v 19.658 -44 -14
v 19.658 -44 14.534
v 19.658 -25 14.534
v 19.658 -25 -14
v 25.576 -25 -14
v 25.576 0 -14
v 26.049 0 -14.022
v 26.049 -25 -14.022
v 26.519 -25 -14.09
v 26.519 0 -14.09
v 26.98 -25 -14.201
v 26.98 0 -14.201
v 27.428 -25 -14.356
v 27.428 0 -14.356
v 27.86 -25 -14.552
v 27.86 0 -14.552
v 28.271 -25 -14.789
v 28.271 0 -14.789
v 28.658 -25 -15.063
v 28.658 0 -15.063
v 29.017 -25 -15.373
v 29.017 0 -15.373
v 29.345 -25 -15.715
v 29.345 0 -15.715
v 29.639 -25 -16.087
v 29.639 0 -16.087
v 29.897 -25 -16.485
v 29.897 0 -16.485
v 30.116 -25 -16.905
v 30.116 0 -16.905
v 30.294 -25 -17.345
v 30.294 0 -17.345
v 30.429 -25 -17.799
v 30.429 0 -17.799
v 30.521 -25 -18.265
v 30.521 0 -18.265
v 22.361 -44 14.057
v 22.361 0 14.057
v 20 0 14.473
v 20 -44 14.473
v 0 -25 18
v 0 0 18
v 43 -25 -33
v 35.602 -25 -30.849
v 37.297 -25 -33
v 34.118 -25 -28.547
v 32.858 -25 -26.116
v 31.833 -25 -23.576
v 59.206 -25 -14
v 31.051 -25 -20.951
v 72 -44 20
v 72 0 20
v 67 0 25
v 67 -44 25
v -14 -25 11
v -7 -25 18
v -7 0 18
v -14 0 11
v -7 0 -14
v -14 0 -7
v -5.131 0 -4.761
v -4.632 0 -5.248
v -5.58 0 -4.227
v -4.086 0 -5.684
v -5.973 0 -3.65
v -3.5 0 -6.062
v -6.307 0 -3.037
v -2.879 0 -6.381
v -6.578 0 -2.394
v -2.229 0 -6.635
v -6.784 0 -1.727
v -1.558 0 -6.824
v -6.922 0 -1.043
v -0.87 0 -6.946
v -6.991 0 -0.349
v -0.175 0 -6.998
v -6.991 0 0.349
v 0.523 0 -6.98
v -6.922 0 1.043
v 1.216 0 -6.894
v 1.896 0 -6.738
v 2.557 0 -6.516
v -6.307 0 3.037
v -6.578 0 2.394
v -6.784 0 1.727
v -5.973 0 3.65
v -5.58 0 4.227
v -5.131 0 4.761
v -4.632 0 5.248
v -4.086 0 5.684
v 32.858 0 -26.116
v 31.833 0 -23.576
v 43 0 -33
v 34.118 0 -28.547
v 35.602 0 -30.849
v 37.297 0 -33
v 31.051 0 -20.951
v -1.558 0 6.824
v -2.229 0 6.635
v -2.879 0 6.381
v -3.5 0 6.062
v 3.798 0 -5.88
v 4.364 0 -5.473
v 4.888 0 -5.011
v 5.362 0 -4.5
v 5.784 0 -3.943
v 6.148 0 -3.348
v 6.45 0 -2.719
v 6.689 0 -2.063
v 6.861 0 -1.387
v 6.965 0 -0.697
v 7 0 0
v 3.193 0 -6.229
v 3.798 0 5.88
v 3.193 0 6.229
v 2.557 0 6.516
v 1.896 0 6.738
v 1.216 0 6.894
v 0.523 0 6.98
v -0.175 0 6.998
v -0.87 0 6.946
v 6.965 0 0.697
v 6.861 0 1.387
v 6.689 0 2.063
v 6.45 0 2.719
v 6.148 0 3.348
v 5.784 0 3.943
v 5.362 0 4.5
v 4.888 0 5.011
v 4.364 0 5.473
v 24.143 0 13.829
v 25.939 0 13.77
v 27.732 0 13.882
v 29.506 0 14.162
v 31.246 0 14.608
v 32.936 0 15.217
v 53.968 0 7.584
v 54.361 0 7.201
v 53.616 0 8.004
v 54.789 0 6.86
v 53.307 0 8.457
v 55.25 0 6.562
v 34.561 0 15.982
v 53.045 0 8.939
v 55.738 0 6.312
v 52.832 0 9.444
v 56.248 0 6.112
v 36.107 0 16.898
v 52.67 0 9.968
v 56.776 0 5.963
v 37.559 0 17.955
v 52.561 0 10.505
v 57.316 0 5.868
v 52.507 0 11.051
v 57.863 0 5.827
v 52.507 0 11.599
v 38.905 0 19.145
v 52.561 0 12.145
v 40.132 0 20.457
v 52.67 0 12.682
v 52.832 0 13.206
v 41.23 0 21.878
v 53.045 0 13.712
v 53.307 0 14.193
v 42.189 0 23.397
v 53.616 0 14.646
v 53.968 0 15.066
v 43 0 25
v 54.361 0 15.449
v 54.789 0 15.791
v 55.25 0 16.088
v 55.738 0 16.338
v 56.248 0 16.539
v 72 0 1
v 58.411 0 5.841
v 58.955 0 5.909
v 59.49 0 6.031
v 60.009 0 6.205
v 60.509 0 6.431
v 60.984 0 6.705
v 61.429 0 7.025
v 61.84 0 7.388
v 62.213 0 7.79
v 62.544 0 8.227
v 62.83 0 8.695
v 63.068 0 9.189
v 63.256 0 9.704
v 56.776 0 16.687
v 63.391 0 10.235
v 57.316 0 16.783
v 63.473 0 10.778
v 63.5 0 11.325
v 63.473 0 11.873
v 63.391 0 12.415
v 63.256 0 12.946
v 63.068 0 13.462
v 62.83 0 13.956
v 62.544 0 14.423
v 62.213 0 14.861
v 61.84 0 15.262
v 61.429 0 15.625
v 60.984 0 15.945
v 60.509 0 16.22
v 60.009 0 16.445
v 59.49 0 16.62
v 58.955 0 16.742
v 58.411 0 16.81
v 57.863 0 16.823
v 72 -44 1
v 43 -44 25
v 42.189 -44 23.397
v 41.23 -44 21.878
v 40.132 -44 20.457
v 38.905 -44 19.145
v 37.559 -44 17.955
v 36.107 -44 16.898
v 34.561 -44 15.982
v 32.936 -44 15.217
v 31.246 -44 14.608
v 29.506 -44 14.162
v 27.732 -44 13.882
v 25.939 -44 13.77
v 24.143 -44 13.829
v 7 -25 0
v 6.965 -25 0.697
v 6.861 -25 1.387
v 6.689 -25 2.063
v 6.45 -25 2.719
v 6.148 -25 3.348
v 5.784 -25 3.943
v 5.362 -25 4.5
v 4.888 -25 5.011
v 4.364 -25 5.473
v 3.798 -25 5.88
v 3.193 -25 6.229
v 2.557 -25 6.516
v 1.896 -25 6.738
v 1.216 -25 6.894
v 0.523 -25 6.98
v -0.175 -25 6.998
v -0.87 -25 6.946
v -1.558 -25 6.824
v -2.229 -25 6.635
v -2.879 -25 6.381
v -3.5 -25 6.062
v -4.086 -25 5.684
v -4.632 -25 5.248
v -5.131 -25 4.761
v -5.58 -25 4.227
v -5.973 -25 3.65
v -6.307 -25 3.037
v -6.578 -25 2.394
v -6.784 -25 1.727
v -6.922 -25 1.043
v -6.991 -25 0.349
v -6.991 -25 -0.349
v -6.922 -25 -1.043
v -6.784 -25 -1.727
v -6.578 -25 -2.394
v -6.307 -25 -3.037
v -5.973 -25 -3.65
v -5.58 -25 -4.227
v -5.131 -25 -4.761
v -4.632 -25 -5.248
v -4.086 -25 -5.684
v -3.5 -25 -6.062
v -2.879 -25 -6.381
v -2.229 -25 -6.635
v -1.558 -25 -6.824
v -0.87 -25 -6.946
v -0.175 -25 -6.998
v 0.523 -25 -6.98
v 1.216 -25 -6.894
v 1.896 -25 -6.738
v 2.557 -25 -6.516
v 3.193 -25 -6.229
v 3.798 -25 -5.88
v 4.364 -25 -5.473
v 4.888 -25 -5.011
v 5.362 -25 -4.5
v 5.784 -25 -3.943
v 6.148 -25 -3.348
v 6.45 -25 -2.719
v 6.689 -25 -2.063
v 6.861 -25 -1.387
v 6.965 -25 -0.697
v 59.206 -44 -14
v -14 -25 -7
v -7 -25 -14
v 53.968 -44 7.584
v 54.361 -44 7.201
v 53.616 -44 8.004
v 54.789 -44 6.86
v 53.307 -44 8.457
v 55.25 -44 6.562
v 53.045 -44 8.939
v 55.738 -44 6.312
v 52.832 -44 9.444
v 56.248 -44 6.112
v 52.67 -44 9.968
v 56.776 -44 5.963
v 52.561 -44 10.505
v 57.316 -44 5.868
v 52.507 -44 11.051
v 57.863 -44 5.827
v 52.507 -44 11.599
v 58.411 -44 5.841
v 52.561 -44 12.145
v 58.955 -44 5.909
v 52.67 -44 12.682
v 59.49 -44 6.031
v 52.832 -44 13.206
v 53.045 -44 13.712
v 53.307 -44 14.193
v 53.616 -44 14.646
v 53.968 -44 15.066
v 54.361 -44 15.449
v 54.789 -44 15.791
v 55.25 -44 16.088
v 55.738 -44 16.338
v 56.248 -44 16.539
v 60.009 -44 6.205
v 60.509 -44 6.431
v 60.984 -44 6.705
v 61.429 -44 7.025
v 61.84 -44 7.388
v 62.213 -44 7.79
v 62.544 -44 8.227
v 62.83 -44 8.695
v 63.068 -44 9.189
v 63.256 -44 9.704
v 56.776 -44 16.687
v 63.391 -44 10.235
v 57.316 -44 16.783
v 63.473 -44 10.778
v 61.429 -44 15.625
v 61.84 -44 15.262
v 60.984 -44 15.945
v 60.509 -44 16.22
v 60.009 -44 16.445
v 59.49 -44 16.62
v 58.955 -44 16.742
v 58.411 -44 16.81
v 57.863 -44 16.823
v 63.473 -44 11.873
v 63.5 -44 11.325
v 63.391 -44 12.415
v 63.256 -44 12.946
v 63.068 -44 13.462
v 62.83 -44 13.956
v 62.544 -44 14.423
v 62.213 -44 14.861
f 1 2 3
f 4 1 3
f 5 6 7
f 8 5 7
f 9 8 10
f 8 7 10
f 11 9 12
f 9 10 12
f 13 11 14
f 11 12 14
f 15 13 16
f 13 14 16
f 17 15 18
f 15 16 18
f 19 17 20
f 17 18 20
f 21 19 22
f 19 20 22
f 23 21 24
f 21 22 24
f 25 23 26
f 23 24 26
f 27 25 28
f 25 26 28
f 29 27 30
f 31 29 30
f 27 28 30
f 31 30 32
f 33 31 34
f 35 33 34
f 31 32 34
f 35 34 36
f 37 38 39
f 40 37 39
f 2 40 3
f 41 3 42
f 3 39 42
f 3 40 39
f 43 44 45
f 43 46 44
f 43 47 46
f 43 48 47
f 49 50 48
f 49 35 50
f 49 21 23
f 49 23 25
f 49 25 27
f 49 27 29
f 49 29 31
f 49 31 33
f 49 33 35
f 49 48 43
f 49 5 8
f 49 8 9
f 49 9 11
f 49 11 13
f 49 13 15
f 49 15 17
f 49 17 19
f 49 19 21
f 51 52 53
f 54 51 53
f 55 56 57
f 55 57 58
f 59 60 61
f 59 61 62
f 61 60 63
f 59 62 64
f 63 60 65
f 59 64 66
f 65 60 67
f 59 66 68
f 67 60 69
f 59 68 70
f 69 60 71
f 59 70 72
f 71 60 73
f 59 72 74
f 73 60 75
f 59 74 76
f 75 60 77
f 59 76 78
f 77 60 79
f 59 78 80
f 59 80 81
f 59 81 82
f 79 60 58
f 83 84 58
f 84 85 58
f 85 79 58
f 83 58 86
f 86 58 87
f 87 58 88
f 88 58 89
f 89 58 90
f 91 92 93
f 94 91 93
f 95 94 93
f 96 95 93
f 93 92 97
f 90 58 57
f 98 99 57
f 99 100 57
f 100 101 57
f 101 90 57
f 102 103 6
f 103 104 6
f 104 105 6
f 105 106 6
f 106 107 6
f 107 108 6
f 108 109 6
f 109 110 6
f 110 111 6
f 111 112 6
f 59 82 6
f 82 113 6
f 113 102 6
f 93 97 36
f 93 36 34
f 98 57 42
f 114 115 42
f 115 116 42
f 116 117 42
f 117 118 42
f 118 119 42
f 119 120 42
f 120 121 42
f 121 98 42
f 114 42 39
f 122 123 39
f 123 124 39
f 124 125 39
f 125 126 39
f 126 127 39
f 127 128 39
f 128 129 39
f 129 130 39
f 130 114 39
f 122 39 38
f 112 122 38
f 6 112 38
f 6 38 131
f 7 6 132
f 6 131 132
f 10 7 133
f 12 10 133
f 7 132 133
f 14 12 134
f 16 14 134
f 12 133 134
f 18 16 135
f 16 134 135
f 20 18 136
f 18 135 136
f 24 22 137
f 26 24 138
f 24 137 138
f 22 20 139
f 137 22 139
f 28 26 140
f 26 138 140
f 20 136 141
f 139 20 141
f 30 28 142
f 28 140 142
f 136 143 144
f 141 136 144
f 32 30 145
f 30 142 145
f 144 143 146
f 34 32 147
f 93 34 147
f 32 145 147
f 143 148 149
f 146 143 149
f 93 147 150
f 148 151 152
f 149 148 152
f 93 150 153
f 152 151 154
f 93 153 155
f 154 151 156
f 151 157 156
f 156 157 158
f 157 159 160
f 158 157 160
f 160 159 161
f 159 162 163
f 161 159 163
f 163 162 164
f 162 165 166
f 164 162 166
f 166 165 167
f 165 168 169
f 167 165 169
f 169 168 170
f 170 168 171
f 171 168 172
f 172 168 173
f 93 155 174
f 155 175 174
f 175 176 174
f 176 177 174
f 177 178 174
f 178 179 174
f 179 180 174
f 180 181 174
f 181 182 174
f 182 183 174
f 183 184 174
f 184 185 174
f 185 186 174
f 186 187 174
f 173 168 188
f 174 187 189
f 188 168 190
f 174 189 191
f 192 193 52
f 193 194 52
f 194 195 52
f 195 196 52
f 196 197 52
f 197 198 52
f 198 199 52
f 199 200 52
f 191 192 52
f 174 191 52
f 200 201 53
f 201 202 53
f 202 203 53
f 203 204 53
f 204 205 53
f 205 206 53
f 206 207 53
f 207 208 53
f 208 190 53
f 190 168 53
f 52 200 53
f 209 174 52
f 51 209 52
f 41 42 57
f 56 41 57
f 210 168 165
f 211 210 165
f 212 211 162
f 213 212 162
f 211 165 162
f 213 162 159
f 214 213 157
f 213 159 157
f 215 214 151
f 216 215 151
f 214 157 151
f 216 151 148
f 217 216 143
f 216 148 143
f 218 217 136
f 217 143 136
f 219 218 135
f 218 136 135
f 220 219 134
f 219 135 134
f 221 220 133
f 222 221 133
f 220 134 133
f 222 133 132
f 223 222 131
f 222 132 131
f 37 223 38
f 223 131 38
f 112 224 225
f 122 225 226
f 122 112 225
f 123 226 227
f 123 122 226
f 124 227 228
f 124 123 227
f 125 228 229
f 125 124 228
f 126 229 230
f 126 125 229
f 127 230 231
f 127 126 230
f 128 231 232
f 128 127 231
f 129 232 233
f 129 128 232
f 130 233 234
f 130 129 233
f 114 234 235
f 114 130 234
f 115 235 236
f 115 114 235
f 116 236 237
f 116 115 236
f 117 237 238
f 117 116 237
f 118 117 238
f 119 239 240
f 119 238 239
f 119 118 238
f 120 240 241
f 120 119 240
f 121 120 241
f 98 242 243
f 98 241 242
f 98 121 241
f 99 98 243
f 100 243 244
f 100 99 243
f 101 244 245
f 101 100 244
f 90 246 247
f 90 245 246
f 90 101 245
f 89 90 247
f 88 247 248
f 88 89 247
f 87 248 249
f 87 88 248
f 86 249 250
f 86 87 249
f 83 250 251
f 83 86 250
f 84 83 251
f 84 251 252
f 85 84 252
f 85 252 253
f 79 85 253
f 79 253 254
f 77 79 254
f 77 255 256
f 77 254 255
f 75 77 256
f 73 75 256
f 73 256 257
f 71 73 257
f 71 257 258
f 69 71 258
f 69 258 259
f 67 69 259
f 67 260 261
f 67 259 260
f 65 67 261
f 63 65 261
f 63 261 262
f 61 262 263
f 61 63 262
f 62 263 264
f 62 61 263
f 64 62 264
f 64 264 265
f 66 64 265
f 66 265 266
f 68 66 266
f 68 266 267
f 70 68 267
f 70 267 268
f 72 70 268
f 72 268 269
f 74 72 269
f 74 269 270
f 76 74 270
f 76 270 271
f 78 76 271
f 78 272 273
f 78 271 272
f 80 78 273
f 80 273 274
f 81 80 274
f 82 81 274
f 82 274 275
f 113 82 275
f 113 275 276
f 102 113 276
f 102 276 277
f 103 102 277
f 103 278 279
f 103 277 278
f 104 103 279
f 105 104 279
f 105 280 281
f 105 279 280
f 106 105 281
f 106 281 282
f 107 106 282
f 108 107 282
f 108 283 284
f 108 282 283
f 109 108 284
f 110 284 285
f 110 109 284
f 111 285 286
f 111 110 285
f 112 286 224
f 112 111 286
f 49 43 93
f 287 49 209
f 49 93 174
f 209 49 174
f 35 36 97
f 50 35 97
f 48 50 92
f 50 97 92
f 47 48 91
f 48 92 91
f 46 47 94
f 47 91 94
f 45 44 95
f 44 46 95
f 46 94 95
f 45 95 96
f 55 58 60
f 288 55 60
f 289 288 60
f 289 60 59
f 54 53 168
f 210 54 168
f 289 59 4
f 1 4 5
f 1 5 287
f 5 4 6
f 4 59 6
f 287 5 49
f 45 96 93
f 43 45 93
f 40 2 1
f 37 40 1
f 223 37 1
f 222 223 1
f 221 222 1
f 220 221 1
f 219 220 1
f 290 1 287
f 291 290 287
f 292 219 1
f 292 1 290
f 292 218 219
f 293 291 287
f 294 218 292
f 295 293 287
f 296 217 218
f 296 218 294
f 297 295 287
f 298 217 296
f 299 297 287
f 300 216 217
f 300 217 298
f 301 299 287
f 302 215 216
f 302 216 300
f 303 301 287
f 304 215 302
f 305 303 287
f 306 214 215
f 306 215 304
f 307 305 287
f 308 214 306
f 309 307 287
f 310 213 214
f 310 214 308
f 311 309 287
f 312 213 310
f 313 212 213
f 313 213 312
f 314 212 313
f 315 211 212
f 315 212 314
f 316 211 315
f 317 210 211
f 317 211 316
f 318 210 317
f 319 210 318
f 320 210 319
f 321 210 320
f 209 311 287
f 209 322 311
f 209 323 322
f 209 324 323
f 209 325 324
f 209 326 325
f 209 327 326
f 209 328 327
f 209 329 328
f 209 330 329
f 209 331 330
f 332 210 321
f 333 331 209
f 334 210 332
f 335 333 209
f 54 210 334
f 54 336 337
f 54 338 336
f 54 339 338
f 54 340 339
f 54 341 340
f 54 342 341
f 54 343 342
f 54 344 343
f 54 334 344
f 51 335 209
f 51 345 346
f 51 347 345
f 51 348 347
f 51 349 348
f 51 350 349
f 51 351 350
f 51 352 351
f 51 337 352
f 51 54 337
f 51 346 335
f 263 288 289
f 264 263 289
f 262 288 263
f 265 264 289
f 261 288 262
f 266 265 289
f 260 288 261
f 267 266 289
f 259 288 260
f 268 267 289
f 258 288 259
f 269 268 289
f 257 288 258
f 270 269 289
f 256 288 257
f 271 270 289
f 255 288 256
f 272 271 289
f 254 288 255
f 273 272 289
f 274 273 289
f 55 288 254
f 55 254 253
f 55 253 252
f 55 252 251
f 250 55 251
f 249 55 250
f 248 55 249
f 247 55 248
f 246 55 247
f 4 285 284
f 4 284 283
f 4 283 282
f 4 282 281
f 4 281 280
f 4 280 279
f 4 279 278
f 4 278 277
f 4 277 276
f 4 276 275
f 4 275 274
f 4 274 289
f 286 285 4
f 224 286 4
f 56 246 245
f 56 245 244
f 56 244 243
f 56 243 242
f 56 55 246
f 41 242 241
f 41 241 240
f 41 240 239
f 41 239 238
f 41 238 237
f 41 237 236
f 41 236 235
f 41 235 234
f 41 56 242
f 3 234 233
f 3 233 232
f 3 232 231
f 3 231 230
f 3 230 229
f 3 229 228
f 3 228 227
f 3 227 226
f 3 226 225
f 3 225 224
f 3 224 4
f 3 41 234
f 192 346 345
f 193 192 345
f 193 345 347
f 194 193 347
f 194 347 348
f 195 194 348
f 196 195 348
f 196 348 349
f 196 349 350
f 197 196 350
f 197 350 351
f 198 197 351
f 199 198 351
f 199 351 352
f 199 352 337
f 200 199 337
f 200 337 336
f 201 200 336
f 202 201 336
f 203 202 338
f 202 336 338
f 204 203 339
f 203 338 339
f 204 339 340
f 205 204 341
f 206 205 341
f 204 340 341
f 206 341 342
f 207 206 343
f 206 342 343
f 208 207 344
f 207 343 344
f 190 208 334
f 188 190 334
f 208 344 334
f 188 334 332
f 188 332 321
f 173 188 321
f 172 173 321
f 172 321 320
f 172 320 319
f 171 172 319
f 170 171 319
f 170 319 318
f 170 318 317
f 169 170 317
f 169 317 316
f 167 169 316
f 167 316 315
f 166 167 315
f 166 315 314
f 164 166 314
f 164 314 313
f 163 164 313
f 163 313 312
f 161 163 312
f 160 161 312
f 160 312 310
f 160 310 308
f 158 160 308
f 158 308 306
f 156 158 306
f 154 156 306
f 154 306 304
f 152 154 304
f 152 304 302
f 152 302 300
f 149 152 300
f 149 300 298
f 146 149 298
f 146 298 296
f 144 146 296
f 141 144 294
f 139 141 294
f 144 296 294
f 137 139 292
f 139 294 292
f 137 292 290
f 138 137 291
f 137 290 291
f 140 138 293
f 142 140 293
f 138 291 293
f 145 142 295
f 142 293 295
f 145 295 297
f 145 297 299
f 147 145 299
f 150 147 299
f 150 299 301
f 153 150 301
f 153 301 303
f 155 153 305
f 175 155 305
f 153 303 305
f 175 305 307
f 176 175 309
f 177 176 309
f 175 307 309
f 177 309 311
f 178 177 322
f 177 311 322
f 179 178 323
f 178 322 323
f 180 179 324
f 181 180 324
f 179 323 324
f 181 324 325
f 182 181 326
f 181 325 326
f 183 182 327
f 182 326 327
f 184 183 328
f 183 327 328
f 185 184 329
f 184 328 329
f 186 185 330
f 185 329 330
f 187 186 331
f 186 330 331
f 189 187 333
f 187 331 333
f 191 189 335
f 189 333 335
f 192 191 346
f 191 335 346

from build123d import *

# Parameters (mm, degrees)
F0_R     = 7
F1_DEPTH = 44
F2_W     = 34
F2_H     = 19
F3_DEPTH = 51.001
F4_W     = 35.544027
F4_H     = 19
F5_DEPTH = 19
F6_R     = 5.5
F7_DEPTH = 44.001


with BuildPart() as f1:
    # F0 (on Front) → F1 (new body)
    with BuildSketch(Plane.XZ):
        Polygon((-7, 18), (-14, 11), (-14, -7), (-7, -14), (20, -14), (20, 14.47346), (0, 18), align=None)
        Circle(F0_R, mode=Mode.SUBTRACT)
        with BuildLine():
            Line((22.361381, 14.057085), (20, 14.47346))
            Line((20, 14.47346), (20, -14))
            Line((20, -14), (25.575539, -14))
            ThreePointArc((25.575539, -14), (28.840775, -15.213414), (30.521178, -18.264706))
            ThreePointArc((30.521178, -18.264706), (32.858008, -26.115672), (37.29698, -33))
            Line((37.29698, -33), (43, -33))
            Line((43, -33), (72, 1))
            Line((72, 1), (72, 20))
            Line((72, 20), (67, 25))
            Line((67, 25), (43, 25))
            ThreePointArc((43, 25), (34.561099, 15.982044), (22.361381, 14.057085))
        make_face()
    extrude(amount=F1_DEPTH)

    # F2 (on face) → F3 (cut, through all)
    with BuildSketch(Plane.XY.offset(18)):
        with Locations((2.657733, -34.5)):
            Rectangle(F2_W, F2_H)
    extrude(amount=-F3_DEPTH, mode=Mode.SUBTRACT)

    # F4 (on face) → F5 (cut)
    with BuildSketch(Plane.XZ.offset(44)):
        with Locations((43.347552, -23.5)):
            Rectangle(F4_W, F4_H)
    extrude(amount=-F5_DEPTH, mode=Mode.SUBTRACT)

    # F6 (on face) → F7 (cut, through all)
    with BuildSketch(Plane.XZ.offset(44)):
        with Locations((58, 11.325206)):
            Circle(F6_R)
    extrude(amount=-F7_DEPTH, mode=Mode.SUBTRACT)


solid = f1.part
